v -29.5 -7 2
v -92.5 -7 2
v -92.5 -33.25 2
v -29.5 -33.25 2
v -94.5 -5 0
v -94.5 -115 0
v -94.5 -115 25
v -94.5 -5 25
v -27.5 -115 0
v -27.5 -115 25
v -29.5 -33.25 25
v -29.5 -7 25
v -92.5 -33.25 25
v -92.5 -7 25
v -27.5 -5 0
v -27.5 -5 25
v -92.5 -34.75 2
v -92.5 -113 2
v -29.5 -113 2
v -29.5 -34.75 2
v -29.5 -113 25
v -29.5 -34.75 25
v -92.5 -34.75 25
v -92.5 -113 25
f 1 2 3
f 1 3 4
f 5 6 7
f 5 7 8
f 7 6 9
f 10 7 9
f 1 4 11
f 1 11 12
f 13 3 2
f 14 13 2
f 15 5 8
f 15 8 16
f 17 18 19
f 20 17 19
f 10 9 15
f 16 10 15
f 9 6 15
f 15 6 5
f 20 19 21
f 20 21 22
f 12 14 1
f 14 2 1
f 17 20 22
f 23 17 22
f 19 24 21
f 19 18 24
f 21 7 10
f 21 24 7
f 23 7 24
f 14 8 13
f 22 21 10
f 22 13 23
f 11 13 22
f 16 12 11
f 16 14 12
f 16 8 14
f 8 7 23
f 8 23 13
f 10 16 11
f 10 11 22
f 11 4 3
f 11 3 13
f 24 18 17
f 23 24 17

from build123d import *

# Parameters (mm, degrees)
SKETCH022_W    = 67
SKETCH022_H    = 110
PAD009_DEPTH   = 25
THICKNESS002_T = -2
SKETCH023_W    = 1.5
SKETCH023_H    = 25
PAD010_DEPTH   = 63


with BuildPart() as part:
    # Sketch022 → Pad009 (new body)
    with BuildSketch(Plane.XY):
        Rectangle(SKETCH022_W, SKETCH022_H)
    extrude(amount=PAD009_DEPTH)

    # Thickness002
    thickness002_openings = [part.faces().sort_by_distance(p)[0] for p in [
        (0, 0, 25),
    ]]
    offset(amount=THICKNESS002_T, openings=thickness002_openings)

    # Sketch023 (on DatumPlane) → Pad010 (join)
    with BuildSketch(Plane(origin=(-31.5, 26, 0), x_dir=(0, 1, 0), z_dir=(1, 0, 0))):
        with Locations((0, 12.5)):
            Rectangle(SKETCH023_W, SKETCH023_H)
    extrude(amount=PAD010_DEPTH)


with BuildPart() as part_1:
    # Body010 placement: moved
    add(part.part.moved(Location((-61, -60, 0))))


solid = part_1.part
